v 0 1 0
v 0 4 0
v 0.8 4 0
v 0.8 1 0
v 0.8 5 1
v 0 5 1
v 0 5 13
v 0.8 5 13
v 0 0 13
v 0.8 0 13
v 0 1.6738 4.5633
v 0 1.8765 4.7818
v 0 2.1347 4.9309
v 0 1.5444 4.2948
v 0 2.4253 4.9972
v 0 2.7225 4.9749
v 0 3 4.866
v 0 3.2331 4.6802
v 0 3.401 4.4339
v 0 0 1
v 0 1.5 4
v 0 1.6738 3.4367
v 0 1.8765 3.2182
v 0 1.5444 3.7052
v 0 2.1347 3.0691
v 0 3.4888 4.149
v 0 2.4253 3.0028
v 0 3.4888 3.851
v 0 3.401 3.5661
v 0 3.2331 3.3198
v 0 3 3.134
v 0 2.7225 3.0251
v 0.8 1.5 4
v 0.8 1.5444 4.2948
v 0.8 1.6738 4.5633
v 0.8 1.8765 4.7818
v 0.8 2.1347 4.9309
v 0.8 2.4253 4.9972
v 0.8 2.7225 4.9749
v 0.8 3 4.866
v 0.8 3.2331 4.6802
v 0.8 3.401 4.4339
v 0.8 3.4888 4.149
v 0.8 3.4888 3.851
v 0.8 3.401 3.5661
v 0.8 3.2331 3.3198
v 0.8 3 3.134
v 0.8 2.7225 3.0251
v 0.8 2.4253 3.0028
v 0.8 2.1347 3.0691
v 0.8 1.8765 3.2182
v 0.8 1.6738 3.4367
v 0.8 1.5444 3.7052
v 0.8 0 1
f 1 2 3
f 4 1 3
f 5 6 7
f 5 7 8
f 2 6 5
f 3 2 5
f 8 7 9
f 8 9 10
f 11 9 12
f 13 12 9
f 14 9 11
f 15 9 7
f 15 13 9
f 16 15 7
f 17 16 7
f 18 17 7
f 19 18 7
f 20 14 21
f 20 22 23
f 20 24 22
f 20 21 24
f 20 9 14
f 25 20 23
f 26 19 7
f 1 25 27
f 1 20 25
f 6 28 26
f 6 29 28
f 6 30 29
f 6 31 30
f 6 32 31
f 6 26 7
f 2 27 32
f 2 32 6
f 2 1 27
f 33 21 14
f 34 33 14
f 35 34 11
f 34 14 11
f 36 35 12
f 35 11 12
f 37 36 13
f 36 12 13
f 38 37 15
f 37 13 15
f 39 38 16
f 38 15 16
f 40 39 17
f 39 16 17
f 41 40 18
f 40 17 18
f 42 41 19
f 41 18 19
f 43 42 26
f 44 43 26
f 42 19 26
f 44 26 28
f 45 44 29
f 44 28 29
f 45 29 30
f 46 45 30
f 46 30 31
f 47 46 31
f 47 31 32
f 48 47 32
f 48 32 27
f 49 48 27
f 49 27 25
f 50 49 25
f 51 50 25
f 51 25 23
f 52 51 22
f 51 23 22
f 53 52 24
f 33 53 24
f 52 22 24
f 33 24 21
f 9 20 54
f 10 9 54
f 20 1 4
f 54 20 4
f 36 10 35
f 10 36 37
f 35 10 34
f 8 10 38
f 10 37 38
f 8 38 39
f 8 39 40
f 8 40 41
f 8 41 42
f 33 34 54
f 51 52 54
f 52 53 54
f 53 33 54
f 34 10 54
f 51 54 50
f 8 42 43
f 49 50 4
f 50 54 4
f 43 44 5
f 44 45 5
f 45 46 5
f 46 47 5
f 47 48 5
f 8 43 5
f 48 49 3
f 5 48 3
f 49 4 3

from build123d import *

# Parameters (mm, degrees)
F0_W     = 0.8
F0_H     = 5
F1_DEPTH = 13
F2_R     = 1
F3_DEPTH = 0.8
F4_SIZE  = 1


with BuildPart() as f1:
    # F0 (on Top) → F1 (new body)
    with BuildSketch(Plane.XY):
        with Locations((0.4, 2.5)):
            Rectangle(F0_W, F0_H)
    extrude(amount=F1_DEPTH)

    # F2 (on face) → F3 (cut, through all)
    with BuildSketch(Plane(origin=(0, 0, 0), x_dir=(0, -1, 0), z_dir=(-1, 0, 0))):
        with Locations((-2.5, 4)):
            Circle(F2_R)
    extrude(amount=-F3_DEPTH, mode=Mode.SUBTRACT)

    # F4
    f4_edges = [f1.edges().sort_by_distance(p)[0] for p in [
        (0.4, 5, 0),
        (0.4, 0, 0),
    ]]
    chamfer(f4_edges, length=F4_SIZE)


solid = f1.part
